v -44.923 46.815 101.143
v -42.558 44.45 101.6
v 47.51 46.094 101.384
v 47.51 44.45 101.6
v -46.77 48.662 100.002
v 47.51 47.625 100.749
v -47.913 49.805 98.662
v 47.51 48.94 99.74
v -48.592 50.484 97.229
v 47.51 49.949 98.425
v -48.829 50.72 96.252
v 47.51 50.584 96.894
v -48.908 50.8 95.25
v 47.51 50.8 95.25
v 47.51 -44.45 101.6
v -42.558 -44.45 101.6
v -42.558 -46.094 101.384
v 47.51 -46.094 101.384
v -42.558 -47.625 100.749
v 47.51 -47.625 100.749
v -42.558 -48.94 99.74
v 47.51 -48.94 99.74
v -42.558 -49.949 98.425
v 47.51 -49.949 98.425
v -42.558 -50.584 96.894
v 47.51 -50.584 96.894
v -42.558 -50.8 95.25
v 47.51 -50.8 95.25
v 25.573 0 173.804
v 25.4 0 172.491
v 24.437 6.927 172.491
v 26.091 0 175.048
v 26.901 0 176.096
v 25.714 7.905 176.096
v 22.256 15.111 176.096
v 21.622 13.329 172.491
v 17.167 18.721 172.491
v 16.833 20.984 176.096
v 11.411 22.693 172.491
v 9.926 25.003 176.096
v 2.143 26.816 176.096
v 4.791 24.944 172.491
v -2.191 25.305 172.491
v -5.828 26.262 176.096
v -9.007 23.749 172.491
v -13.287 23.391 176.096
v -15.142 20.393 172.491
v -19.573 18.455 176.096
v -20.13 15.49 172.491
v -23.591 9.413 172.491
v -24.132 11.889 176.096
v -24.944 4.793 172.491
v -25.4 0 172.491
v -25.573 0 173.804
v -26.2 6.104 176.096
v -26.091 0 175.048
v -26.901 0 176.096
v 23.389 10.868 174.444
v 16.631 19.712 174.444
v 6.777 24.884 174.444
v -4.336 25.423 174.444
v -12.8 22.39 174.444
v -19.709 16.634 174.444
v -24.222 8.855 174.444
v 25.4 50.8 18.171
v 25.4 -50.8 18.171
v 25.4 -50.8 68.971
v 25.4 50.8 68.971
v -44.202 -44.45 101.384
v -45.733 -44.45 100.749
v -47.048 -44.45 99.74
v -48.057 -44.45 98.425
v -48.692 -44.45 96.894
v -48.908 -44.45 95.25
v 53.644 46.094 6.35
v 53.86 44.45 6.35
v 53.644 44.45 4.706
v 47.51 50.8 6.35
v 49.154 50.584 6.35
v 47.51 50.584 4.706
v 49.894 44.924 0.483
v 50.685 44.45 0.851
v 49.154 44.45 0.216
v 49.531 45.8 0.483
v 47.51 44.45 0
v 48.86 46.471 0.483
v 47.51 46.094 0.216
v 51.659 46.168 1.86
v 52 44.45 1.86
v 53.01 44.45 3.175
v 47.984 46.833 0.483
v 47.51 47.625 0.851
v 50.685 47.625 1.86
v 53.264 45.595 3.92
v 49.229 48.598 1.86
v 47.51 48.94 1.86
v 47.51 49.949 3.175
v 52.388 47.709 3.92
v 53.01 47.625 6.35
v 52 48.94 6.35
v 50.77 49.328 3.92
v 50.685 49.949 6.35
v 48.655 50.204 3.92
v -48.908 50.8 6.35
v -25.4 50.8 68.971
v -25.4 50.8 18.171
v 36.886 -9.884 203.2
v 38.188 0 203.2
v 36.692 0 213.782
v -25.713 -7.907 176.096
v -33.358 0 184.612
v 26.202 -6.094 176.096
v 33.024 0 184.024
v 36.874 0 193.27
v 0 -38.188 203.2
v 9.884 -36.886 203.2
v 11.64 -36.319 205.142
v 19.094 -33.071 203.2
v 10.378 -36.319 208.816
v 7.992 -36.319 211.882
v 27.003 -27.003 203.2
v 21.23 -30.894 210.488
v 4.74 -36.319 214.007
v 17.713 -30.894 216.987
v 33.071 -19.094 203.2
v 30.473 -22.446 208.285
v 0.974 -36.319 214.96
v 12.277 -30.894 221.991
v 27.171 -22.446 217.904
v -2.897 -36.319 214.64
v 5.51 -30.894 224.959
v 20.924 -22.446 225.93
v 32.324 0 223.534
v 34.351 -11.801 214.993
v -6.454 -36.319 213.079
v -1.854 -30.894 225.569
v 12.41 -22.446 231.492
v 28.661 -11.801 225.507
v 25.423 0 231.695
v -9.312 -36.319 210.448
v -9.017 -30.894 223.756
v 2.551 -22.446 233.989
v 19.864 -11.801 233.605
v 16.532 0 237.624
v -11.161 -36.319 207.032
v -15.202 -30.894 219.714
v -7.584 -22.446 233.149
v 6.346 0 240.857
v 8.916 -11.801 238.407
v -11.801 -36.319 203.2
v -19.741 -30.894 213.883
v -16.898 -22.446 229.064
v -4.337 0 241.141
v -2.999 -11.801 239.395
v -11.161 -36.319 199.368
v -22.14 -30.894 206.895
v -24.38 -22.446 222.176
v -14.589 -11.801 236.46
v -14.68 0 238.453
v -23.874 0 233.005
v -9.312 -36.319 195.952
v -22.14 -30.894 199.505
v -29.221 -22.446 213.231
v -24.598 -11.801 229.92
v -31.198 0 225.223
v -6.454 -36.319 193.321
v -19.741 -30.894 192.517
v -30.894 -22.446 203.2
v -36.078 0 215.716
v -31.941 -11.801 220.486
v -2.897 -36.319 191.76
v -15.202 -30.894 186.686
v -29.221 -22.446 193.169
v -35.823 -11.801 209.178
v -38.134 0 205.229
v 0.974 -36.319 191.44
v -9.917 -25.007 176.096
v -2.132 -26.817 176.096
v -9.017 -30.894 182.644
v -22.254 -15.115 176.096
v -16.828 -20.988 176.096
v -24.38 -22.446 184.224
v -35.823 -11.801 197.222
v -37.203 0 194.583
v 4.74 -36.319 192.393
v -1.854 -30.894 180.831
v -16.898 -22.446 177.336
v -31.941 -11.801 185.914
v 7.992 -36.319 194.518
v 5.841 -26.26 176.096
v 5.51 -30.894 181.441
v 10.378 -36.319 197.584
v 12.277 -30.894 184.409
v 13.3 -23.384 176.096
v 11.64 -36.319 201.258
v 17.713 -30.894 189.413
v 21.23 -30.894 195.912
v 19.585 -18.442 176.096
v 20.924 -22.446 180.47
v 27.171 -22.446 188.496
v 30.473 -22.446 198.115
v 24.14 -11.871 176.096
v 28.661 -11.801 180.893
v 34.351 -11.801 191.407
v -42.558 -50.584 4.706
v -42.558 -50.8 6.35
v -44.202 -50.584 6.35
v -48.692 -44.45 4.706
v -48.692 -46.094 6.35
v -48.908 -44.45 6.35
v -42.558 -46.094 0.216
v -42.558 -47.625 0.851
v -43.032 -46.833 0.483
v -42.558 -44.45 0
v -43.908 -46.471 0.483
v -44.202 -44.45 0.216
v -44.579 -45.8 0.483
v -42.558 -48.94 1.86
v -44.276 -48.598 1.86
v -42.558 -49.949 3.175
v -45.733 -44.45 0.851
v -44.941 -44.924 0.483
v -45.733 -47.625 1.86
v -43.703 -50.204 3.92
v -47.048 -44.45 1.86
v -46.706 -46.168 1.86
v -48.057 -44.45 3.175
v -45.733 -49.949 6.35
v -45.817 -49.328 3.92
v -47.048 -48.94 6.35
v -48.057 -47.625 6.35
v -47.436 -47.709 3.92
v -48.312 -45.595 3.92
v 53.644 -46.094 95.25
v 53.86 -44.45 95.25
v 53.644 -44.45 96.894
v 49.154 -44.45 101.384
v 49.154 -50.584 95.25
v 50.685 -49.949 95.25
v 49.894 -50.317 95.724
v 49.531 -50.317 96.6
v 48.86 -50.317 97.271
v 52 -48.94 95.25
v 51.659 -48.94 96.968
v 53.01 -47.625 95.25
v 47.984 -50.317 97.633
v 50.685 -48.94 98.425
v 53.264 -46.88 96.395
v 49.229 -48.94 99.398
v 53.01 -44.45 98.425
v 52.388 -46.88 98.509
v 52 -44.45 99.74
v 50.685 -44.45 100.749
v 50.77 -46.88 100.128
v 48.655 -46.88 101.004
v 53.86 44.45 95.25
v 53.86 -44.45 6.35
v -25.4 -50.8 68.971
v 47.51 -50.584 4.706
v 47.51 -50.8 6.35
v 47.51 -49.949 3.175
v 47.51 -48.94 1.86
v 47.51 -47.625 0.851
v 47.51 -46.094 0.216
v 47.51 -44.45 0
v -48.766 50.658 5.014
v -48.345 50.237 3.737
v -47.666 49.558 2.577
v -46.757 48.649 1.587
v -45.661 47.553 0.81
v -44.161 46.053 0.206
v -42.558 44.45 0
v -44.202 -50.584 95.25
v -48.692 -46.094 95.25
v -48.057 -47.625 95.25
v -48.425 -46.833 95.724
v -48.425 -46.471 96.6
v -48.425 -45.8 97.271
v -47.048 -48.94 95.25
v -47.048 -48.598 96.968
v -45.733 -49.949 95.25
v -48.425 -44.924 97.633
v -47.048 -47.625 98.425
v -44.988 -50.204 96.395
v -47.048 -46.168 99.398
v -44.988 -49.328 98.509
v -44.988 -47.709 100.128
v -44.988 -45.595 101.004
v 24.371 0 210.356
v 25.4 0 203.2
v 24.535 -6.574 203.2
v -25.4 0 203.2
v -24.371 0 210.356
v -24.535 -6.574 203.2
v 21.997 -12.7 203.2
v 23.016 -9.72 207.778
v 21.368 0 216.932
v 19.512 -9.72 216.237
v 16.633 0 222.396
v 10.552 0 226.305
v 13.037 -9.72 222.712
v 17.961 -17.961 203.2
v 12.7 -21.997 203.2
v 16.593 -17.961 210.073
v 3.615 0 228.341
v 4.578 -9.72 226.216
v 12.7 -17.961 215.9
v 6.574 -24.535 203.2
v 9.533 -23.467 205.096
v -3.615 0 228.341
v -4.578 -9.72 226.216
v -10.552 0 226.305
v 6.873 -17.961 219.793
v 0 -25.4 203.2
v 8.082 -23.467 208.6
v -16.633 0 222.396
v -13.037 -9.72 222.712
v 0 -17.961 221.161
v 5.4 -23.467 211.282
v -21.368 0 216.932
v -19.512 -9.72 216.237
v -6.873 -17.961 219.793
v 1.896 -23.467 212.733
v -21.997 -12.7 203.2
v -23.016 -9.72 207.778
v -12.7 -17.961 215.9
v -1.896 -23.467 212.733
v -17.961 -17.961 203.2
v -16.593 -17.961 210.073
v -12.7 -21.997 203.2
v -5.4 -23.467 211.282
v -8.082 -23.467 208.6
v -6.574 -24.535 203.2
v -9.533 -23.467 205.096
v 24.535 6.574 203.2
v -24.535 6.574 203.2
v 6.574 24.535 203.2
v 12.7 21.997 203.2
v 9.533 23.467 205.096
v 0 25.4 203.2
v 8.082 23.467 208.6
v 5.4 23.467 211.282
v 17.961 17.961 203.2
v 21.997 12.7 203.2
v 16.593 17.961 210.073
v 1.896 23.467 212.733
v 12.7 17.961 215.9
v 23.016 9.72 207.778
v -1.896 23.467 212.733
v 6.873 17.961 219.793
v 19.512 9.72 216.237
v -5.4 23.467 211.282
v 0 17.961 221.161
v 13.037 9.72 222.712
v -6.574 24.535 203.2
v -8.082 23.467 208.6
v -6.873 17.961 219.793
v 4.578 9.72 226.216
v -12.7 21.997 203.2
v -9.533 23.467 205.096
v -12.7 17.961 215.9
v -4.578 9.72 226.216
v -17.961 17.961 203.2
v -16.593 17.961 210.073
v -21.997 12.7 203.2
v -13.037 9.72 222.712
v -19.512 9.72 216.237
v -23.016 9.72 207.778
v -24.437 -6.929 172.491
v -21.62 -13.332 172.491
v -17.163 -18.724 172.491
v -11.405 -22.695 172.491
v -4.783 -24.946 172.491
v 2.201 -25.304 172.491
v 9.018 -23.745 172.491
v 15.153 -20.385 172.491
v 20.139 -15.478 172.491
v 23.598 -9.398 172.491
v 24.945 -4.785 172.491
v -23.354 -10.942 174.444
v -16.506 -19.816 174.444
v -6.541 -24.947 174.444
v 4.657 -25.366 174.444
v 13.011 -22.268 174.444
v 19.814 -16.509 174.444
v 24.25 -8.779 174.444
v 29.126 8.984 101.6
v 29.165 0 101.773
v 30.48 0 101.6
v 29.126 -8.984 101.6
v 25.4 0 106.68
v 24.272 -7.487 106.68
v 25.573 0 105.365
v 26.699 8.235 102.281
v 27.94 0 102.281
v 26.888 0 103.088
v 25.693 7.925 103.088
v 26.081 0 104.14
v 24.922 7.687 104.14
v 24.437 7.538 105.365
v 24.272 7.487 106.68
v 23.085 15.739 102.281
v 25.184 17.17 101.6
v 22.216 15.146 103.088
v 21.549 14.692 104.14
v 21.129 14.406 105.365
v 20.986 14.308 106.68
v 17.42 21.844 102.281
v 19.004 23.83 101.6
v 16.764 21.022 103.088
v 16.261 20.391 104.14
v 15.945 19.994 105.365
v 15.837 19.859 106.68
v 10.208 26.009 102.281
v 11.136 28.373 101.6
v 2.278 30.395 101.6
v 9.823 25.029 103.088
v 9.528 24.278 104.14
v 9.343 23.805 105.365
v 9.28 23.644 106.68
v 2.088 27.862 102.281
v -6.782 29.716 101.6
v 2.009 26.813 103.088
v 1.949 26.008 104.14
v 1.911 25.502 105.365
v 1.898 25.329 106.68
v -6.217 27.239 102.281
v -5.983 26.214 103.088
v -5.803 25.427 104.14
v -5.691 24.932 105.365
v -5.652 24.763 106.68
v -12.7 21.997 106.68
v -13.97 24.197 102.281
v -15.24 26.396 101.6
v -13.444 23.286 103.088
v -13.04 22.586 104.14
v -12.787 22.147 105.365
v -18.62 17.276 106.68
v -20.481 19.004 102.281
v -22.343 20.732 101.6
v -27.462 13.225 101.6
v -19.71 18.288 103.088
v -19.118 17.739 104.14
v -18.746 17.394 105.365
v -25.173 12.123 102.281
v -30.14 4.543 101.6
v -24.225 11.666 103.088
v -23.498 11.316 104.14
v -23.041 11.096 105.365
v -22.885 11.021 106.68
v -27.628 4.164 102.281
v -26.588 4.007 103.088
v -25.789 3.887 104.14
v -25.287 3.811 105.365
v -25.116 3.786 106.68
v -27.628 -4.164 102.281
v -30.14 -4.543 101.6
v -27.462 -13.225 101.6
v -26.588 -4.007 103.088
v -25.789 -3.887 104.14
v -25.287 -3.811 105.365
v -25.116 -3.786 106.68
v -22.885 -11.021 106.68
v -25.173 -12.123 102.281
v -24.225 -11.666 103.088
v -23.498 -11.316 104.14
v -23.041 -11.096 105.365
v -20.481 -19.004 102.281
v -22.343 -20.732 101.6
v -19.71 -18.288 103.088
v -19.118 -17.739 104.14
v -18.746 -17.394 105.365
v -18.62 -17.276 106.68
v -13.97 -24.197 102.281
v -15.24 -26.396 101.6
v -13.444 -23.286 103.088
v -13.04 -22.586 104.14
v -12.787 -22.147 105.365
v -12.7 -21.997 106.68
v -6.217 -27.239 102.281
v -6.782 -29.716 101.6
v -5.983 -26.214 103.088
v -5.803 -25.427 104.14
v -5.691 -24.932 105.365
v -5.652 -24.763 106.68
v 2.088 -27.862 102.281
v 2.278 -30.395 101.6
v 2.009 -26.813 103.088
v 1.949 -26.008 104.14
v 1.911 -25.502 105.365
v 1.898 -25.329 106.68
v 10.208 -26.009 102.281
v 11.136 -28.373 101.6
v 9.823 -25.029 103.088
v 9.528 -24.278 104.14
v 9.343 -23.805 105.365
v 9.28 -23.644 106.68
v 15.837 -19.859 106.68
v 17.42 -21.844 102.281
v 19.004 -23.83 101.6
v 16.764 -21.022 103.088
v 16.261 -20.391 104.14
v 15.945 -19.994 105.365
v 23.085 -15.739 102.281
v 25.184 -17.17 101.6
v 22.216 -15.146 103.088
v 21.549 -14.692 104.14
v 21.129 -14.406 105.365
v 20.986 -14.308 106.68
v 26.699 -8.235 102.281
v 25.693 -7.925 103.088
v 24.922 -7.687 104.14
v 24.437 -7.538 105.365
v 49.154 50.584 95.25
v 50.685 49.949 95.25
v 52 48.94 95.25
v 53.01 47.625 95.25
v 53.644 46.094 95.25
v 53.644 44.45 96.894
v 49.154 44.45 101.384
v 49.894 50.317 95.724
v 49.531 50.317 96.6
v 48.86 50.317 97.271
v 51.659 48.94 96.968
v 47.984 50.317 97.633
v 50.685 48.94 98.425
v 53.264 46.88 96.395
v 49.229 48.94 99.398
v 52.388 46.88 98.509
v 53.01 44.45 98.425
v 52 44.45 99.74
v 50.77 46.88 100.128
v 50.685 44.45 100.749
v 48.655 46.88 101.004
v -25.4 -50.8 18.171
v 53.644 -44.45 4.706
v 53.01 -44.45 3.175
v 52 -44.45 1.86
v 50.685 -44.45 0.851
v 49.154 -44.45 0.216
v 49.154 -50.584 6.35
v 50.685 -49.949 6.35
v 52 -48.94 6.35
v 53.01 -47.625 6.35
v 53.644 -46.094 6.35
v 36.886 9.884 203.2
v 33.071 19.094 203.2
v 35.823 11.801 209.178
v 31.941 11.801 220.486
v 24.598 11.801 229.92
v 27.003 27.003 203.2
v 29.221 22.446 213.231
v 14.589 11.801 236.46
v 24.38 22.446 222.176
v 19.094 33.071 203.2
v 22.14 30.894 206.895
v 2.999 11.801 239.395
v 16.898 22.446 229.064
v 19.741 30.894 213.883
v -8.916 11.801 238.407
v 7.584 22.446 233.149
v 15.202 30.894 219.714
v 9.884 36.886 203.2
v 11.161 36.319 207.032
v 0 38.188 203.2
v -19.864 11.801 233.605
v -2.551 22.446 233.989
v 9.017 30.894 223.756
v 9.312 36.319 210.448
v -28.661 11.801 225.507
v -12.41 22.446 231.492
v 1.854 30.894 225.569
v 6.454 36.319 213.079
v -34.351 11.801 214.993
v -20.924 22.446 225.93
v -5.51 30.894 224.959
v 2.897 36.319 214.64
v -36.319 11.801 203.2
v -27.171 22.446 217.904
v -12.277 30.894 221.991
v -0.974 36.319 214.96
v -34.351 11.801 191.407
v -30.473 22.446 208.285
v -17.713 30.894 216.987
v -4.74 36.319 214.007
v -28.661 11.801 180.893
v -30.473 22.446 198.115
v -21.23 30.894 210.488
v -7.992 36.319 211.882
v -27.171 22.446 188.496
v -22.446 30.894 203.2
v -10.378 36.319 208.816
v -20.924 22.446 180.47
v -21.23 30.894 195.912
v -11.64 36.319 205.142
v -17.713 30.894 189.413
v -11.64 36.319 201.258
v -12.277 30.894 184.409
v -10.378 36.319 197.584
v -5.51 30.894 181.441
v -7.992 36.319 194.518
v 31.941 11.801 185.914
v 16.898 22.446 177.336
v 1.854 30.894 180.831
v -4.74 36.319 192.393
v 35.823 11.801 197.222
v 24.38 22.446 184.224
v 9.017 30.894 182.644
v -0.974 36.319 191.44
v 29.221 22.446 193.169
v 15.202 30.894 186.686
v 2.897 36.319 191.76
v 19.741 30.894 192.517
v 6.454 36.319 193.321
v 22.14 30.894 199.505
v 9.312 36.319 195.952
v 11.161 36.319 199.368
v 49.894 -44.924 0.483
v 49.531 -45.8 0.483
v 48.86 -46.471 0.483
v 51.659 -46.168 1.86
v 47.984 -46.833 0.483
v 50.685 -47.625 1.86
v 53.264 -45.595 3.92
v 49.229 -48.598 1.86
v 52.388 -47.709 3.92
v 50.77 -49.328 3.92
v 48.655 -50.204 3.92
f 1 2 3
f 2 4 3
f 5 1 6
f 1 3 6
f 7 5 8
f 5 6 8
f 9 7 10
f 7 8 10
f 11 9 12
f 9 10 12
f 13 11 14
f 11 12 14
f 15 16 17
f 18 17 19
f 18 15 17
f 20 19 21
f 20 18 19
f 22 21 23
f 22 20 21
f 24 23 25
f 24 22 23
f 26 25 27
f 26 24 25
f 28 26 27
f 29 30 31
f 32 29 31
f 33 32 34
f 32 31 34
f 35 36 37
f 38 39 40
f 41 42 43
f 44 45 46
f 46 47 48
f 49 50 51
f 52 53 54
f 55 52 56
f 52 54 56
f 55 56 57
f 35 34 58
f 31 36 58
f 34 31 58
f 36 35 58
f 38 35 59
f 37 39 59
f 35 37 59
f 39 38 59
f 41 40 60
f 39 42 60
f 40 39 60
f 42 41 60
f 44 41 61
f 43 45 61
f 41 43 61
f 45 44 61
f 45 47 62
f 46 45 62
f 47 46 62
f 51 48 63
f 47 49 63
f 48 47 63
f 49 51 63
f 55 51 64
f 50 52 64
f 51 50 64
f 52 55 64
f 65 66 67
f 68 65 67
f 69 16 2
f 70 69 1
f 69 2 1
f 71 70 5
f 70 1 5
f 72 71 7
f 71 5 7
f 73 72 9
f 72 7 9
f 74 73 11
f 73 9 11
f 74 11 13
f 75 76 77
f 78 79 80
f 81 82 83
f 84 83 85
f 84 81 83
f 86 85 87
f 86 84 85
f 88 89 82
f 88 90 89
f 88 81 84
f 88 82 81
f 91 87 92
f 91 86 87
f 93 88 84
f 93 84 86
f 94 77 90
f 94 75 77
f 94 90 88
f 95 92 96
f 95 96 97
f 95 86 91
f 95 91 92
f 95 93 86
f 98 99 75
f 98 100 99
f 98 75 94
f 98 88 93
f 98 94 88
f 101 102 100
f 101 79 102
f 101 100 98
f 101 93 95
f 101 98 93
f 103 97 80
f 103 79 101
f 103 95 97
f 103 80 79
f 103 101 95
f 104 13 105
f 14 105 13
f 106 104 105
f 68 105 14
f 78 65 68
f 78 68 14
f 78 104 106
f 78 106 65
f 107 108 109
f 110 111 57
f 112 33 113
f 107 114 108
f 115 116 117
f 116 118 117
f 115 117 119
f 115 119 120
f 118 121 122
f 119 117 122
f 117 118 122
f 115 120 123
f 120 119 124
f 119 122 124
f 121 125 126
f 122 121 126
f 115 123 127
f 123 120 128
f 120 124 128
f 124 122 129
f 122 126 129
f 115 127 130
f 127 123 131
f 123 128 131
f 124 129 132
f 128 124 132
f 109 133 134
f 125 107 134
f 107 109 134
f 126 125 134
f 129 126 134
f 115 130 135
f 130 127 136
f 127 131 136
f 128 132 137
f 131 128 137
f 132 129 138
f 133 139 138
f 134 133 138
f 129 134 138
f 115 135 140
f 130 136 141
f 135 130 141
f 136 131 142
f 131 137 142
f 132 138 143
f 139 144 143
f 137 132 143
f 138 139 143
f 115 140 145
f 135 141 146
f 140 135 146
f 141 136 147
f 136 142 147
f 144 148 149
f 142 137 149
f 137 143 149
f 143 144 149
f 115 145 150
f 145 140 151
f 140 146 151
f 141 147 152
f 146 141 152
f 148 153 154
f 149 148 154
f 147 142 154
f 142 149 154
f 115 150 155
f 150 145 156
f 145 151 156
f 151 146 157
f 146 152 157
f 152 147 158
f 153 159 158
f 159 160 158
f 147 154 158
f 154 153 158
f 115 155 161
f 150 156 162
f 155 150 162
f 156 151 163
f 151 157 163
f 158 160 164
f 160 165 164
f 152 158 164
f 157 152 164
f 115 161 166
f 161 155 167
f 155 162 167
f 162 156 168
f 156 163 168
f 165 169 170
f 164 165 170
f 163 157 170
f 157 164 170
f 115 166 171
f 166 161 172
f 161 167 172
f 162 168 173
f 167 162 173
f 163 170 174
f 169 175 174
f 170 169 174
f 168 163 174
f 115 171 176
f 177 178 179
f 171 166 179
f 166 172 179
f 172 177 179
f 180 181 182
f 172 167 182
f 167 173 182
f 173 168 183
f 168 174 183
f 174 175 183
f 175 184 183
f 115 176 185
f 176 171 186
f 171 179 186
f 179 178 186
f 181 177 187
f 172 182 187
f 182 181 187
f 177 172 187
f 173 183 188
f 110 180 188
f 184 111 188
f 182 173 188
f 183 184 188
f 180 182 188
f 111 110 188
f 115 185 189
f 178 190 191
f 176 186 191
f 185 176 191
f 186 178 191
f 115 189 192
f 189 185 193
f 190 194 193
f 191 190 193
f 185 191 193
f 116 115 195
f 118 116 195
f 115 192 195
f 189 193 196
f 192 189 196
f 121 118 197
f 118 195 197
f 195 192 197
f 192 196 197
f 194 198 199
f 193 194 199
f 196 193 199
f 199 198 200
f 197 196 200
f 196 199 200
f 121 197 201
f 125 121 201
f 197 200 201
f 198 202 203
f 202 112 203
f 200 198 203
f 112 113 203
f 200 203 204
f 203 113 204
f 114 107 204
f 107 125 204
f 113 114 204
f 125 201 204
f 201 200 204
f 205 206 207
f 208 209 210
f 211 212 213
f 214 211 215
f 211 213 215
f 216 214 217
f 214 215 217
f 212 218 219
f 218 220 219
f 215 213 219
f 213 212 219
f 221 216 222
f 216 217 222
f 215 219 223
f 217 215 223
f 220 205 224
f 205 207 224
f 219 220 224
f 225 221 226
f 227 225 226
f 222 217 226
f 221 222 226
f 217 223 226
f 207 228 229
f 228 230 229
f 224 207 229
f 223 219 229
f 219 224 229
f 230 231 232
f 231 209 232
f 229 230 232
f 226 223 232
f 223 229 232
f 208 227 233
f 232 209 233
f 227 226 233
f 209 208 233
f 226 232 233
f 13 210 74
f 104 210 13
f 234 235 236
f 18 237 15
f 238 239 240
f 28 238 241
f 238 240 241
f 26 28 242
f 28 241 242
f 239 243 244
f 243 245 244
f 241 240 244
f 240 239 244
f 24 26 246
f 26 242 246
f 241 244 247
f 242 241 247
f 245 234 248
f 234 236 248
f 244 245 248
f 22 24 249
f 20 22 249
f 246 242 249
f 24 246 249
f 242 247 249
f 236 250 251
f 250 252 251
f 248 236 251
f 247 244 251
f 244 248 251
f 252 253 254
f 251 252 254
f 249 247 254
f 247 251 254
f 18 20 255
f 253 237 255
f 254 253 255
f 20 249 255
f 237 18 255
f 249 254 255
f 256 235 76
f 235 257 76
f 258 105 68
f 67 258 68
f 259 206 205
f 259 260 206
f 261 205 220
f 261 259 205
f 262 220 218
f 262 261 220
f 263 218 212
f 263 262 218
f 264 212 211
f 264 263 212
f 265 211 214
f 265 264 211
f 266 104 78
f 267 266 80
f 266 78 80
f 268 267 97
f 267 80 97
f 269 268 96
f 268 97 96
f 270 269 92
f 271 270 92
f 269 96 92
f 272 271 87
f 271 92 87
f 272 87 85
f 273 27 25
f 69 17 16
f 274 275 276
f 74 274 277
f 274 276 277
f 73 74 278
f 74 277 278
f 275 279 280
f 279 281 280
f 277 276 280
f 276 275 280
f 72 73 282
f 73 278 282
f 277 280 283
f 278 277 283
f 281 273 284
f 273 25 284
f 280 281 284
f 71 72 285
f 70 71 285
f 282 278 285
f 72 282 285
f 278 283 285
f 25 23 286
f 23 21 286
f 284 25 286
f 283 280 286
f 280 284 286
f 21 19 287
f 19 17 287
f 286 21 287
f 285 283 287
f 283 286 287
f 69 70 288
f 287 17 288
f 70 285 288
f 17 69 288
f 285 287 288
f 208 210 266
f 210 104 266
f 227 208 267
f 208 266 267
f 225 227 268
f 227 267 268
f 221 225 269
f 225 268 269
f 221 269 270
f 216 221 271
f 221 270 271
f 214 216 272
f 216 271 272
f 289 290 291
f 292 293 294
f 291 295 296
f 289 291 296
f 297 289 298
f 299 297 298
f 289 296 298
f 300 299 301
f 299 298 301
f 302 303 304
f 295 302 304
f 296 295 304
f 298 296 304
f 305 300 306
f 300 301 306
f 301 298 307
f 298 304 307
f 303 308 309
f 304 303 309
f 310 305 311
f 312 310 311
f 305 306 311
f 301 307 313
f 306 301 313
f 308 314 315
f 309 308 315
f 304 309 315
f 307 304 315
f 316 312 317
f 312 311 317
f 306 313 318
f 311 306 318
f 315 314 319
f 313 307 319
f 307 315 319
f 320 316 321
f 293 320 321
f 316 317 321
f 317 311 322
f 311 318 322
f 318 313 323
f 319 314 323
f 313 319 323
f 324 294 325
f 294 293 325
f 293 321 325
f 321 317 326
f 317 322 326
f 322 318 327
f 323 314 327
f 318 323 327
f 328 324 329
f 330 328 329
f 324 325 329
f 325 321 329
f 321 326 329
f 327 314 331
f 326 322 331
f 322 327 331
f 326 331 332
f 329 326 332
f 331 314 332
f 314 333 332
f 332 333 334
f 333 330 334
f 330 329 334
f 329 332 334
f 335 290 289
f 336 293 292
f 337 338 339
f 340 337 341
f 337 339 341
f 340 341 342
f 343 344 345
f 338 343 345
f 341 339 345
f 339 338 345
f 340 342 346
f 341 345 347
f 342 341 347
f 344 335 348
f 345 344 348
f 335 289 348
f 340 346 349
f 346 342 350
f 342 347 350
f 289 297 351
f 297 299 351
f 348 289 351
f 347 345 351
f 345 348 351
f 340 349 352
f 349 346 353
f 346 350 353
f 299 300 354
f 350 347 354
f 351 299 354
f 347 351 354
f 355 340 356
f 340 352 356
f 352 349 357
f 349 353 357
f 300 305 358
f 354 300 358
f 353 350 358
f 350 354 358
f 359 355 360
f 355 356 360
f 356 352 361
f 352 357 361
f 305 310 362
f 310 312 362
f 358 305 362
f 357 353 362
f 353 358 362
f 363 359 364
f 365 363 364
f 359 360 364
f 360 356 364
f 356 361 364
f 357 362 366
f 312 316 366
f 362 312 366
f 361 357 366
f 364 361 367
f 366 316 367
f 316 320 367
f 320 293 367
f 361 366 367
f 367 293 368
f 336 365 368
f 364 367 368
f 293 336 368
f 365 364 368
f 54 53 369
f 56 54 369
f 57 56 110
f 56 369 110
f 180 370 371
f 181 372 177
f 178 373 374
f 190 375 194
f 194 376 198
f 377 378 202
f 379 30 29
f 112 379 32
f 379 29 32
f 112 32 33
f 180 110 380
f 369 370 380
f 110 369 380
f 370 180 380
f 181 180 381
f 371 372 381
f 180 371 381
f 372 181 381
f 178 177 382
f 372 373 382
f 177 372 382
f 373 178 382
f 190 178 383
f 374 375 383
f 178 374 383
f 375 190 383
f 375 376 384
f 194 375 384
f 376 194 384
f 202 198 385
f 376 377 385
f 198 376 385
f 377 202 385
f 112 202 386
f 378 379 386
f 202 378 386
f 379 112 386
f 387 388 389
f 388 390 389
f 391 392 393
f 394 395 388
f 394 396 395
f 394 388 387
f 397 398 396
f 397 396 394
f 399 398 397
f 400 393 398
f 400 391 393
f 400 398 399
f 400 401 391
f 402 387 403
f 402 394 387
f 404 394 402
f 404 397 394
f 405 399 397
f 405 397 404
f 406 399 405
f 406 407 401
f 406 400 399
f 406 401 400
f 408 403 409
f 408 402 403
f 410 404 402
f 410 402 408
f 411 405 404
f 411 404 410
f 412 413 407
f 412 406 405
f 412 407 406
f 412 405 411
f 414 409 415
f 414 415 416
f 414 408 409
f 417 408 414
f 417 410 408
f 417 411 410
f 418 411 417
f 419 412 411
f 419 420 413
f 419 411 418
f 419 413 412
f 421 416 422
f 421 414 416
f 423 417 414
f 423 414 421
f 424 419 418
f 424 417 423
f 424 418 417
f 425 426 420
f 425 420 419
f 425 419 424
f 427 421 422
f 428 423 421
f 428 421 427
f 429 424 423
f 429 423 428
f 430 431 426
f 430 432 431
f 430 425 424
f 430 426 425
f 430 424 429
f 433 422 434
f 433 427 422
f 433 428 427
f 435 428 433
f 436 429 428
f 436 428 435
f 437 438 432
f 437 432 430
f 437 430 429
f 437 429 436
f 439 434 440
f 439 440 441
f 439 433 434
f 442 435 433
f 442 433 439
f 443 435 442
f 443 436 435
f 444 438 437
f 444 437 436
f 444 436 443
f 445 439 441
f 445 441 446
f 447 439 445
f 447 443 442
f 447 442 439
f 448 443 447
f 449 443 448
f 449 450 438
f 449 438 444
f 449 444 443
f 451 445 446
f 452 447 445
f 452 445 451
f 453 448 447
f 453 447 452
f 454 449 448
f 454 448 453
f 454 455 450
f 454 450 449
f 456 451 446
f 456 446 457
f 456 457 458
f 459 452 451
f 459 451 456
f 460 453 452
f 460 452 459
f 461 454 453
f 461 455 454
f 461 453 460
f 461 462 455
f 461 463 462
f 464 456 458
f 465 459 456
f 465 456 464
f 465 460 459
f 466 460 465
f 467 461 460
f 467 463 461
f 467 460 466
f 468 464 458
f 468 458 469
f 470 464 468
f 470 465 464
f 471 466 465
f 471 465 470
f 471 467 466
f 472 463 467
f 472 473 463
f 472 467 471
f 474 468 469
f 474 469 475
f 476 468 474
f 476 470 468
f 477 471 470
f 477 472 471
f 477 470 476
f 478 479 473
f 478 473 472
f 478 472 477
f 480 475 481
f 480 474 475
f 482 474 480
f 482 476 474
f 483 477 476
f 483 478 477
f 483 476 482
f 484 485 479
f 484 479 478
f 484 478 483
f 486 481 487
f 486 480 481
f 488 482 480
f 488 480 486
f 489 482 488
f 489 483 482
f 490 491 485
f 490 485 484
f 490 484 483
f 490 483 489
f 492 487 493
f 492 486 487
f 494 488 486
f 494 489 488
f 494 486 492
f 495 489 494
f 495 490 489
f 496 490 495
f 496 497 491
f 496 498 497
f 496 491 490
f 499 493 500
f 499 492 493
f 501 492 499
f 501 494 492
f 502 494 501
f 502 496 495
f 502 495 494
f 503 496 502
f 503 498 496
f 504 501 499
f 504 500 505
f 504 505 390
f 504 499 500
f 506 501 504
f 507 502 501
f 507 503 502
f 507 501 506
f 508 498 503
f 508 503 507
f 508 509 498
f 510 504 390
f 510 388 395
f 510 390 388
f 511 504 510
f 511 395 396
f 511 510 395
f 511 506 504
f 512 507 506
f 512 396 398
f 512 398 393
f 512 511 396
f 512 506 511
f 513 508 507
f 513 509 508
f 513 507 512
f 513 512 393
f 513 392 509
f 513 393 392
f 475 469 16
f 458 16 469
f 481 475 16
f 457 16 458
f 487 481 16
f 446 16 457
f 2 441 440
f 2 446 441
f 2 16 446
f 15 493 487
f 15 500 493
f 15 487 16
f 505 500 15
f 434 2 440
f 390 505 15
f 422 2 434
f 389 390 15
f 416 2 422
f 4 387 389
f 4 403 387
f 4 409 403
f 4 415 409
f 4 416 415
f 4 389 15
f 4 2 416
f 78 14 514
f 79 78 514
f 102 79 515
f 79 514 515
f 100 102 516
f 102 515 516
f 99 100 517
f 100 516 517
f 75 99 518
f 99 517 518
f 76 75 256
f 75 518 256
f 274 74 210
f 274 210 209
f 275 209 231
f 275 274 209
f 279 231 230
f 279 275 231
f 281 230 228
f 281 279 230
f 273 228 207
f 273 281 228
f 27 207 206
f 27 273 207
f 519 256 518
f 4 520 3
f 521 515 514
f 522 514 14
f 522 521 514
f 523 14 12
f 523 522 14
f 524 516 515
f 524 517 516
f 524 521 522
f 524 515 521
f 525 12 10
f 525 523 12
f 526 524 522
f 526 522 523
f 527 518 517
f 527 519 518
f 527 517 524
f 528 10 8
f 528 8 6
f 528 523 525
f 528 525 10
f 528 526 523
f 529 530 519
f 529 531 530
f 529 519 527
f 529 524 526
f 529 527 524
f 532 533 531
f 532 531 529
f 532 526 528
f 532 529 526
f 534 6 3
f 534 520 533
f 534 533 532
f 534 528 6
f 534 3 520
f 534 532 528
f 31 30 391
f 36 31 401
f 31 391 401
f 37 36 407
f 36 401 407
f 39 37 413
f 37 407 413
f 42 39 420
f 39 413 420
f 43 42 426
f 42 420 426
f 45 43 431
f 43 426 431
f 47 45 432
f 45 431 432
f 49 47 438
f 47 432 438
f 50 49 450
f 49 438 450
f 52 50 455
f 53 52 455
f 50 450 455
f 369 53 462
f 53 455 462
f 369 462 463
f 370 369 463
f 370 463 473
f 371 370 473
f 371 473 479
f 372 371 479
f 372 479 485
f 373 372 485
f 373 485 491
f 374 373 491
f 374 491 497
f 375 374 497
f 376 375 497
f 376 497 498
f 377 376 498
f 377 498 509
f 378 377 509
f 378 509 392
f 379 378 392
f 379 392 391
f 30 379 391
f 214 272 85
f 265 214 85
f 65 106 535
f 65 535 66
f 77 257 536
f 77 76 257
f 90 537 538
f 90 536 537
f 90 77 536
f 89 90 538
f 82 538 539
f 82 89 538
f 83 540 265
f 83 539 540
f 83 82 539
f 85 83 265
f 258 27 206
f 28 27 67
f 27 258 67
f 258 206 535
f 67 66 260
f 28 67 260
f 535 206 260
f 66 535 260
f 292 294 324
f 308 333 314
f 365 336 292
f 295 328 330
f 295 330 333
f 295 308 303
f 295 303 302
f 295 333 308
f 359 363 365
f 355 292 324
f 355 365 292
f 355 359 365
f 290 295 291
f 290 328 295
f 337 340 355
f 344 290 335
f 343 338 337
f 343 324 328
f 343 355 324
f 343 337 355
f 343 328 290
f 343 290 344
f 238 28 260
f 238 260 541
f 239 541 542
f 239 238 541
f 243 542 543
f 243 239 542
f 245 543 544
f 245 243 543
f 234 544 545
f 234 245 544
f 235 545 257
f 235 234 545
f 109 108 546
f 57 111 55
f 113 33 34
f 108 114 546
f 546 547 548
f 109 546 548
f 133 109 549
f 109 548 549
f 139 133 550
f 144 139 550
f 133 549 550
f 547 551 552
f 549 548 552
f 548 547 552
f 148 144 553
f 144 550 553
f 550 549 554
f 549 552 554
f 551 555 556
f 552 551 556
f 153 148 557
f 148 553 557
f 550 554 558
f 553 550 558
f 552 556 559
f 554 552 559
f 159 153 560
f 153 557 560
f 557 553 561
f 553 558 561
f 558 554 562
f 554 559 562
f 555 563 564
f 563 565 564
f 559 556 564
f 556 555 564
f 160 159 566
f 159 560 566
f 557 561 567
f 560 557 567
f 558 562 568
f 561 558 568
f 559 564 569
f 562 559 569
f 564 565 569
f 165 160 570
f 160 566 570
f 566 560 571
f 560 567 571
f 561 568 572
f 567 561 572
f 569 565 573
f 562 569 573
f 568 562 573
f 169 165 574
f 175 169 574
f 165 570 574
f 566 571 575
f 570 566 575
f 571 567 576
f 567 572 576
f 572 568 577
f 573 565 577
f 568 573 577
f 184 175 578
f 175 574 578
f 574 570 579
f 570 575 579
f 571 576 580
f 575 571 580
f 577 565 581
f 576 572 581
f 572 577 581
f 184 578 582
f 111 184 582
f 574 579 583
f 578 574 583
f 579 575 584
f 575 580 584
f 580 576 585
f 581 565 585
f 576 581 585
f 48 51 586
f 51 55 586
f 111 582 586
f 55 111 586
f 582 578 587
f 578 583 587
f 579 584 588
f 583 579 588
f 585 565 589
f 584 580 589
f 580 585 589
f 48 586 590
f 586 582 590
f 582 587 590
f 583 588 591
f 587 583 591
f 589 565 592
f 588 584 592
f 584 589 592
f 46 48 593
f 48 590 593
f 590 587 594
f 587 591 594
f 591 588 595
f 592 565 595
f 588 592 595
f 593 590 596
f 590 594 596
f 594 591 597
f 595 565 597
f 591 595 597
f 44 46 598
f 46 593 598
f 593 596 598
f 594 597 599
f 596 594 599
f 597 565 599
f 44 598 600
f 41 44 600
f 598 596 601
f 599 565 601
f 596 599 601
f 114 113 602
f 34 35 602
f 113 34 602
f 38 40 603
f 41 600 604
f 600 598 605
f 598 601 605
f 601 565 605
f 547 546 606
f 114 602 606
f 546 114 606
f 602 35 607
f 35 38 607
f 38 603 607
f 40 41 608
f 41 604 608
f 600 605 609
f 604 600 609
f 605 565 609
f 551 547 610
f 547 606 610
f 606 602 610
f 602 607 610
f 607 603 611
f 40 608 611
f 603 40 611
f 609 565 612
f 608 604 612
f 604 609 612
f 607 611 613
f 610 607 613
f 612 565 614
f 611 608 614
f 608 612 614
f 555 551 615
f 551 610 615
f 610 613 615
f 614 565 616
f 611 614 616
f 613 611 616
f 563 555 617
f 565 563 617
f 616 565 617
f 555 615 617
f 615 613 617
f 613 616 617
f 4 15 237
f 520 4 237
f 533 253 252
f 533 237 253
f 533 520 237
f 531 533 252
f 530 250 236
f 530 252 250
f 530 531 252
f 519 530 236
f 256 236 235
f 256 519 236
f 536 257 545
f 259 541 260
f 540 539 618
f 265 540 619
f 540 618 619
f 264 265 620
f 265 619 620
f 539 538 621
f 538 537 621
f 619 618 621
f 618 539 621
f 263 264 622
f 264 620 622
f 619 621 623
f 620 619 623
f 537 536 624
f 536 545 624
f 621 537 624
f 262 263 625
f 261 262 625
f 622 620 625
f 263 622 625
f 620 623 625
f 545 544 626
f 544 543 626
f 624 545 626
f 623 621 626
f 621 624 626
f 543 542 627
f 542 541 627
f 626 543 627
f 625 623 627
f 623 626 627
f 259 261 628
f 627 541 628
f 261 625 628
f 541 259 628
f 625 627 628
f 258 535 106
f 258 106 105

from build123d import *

# Parameters (mm, degrees)
F0_W     = 102.7684
F0_H     = 101.6
F1_DEPTH = 101.6
F2_R     = 25.4
F3_DEPTH = 101.6
F6_W     = 50.8
F6_H     = 50.8
F7_DEPTH = 101.6
F8_R     = 6.35
F9_R     = 5.08


with BuildPart() as f1:
    # F0 (on Top) → F1 (new body)
    with BuildSketch(Plane.XY):
        with Locations((2.4761343375, 0)):
            Rectangle(F0_W, F0_H)
    extrude(amount=F1_DEPTH)

    # F2 (on face) → F3 (join)
    with BuildSketch(Plane.XY.offset(101.6)):
        Circle(F2_R)
    extrude(amount=F3_DEPTH)

    # F4 (on face) → F5 (revolve)
    with BuildSketch(Plane.XY.offset(203.2)):
        with BuildLine():
            ThreePointArc((0, -38.1876719344), (27.0027617826, -27.0027617826), (38.1876719344, 0))
            ThreePointArc((38.1876719344, 0), (27.0027617826, 27.0027617826), (0, 38.1876719344))
            Line((0, 38.1876719344), (0, 25.4))
            ThreePointArc((0, 25.4), (17.9605122421, 17.9605122421), (25.4, 0))
            ThreePointArc((25.4, 0), (17.9605122421, -17.9605122421), (0, -25.4))
            Line((0, -25.4), (0, -38.1876719344))
        make_face()
    revolve(axis=Axis((0, -1.256869865, 203.2), (0, -1, 0)))

    # F6 (on face) → F7 (cut)
    with BuildSketch(Plane.XZ.offset(50.8)):
        with Locations((0, 43.5710921884)):
            Rectangle(F6_W, F6_H)
    extrude(amount=-F7_DEPTH, mode=Mode.SUBTRACT)

    # F8
    f8_edges = [f1.edges().sort_by_distance(p)[0] for p in [
        (53.860334, 0, 101.6),
        (53.860334, -50.8, 50.8),
        (53.860334, 50.8, 50.8),
        (53.860334, 0, 0),
        (2.476134, -50.8, 101.6),
        (-48.908066, -50.8, 50.8),
        (-48.908066, 0, 101.6),
        (2.476134, 50.8, 101.6),
        (2.476134, -50.8, 0),
        (-48.908066, 0, 0),
        (2.476134, 50.8, 0),
    ]]
    fillet(f8_edges, radius=F8_R)

    # F9
    f9_edges = [f1.edges().sort_by_distance(p)[0] for p in [
        (-25.4, 0, 101.6),
        (-25.4, 0, 174.68442),
    ]]
    fillet(f9_edges, radius=F9_R)


solid = f1.part
